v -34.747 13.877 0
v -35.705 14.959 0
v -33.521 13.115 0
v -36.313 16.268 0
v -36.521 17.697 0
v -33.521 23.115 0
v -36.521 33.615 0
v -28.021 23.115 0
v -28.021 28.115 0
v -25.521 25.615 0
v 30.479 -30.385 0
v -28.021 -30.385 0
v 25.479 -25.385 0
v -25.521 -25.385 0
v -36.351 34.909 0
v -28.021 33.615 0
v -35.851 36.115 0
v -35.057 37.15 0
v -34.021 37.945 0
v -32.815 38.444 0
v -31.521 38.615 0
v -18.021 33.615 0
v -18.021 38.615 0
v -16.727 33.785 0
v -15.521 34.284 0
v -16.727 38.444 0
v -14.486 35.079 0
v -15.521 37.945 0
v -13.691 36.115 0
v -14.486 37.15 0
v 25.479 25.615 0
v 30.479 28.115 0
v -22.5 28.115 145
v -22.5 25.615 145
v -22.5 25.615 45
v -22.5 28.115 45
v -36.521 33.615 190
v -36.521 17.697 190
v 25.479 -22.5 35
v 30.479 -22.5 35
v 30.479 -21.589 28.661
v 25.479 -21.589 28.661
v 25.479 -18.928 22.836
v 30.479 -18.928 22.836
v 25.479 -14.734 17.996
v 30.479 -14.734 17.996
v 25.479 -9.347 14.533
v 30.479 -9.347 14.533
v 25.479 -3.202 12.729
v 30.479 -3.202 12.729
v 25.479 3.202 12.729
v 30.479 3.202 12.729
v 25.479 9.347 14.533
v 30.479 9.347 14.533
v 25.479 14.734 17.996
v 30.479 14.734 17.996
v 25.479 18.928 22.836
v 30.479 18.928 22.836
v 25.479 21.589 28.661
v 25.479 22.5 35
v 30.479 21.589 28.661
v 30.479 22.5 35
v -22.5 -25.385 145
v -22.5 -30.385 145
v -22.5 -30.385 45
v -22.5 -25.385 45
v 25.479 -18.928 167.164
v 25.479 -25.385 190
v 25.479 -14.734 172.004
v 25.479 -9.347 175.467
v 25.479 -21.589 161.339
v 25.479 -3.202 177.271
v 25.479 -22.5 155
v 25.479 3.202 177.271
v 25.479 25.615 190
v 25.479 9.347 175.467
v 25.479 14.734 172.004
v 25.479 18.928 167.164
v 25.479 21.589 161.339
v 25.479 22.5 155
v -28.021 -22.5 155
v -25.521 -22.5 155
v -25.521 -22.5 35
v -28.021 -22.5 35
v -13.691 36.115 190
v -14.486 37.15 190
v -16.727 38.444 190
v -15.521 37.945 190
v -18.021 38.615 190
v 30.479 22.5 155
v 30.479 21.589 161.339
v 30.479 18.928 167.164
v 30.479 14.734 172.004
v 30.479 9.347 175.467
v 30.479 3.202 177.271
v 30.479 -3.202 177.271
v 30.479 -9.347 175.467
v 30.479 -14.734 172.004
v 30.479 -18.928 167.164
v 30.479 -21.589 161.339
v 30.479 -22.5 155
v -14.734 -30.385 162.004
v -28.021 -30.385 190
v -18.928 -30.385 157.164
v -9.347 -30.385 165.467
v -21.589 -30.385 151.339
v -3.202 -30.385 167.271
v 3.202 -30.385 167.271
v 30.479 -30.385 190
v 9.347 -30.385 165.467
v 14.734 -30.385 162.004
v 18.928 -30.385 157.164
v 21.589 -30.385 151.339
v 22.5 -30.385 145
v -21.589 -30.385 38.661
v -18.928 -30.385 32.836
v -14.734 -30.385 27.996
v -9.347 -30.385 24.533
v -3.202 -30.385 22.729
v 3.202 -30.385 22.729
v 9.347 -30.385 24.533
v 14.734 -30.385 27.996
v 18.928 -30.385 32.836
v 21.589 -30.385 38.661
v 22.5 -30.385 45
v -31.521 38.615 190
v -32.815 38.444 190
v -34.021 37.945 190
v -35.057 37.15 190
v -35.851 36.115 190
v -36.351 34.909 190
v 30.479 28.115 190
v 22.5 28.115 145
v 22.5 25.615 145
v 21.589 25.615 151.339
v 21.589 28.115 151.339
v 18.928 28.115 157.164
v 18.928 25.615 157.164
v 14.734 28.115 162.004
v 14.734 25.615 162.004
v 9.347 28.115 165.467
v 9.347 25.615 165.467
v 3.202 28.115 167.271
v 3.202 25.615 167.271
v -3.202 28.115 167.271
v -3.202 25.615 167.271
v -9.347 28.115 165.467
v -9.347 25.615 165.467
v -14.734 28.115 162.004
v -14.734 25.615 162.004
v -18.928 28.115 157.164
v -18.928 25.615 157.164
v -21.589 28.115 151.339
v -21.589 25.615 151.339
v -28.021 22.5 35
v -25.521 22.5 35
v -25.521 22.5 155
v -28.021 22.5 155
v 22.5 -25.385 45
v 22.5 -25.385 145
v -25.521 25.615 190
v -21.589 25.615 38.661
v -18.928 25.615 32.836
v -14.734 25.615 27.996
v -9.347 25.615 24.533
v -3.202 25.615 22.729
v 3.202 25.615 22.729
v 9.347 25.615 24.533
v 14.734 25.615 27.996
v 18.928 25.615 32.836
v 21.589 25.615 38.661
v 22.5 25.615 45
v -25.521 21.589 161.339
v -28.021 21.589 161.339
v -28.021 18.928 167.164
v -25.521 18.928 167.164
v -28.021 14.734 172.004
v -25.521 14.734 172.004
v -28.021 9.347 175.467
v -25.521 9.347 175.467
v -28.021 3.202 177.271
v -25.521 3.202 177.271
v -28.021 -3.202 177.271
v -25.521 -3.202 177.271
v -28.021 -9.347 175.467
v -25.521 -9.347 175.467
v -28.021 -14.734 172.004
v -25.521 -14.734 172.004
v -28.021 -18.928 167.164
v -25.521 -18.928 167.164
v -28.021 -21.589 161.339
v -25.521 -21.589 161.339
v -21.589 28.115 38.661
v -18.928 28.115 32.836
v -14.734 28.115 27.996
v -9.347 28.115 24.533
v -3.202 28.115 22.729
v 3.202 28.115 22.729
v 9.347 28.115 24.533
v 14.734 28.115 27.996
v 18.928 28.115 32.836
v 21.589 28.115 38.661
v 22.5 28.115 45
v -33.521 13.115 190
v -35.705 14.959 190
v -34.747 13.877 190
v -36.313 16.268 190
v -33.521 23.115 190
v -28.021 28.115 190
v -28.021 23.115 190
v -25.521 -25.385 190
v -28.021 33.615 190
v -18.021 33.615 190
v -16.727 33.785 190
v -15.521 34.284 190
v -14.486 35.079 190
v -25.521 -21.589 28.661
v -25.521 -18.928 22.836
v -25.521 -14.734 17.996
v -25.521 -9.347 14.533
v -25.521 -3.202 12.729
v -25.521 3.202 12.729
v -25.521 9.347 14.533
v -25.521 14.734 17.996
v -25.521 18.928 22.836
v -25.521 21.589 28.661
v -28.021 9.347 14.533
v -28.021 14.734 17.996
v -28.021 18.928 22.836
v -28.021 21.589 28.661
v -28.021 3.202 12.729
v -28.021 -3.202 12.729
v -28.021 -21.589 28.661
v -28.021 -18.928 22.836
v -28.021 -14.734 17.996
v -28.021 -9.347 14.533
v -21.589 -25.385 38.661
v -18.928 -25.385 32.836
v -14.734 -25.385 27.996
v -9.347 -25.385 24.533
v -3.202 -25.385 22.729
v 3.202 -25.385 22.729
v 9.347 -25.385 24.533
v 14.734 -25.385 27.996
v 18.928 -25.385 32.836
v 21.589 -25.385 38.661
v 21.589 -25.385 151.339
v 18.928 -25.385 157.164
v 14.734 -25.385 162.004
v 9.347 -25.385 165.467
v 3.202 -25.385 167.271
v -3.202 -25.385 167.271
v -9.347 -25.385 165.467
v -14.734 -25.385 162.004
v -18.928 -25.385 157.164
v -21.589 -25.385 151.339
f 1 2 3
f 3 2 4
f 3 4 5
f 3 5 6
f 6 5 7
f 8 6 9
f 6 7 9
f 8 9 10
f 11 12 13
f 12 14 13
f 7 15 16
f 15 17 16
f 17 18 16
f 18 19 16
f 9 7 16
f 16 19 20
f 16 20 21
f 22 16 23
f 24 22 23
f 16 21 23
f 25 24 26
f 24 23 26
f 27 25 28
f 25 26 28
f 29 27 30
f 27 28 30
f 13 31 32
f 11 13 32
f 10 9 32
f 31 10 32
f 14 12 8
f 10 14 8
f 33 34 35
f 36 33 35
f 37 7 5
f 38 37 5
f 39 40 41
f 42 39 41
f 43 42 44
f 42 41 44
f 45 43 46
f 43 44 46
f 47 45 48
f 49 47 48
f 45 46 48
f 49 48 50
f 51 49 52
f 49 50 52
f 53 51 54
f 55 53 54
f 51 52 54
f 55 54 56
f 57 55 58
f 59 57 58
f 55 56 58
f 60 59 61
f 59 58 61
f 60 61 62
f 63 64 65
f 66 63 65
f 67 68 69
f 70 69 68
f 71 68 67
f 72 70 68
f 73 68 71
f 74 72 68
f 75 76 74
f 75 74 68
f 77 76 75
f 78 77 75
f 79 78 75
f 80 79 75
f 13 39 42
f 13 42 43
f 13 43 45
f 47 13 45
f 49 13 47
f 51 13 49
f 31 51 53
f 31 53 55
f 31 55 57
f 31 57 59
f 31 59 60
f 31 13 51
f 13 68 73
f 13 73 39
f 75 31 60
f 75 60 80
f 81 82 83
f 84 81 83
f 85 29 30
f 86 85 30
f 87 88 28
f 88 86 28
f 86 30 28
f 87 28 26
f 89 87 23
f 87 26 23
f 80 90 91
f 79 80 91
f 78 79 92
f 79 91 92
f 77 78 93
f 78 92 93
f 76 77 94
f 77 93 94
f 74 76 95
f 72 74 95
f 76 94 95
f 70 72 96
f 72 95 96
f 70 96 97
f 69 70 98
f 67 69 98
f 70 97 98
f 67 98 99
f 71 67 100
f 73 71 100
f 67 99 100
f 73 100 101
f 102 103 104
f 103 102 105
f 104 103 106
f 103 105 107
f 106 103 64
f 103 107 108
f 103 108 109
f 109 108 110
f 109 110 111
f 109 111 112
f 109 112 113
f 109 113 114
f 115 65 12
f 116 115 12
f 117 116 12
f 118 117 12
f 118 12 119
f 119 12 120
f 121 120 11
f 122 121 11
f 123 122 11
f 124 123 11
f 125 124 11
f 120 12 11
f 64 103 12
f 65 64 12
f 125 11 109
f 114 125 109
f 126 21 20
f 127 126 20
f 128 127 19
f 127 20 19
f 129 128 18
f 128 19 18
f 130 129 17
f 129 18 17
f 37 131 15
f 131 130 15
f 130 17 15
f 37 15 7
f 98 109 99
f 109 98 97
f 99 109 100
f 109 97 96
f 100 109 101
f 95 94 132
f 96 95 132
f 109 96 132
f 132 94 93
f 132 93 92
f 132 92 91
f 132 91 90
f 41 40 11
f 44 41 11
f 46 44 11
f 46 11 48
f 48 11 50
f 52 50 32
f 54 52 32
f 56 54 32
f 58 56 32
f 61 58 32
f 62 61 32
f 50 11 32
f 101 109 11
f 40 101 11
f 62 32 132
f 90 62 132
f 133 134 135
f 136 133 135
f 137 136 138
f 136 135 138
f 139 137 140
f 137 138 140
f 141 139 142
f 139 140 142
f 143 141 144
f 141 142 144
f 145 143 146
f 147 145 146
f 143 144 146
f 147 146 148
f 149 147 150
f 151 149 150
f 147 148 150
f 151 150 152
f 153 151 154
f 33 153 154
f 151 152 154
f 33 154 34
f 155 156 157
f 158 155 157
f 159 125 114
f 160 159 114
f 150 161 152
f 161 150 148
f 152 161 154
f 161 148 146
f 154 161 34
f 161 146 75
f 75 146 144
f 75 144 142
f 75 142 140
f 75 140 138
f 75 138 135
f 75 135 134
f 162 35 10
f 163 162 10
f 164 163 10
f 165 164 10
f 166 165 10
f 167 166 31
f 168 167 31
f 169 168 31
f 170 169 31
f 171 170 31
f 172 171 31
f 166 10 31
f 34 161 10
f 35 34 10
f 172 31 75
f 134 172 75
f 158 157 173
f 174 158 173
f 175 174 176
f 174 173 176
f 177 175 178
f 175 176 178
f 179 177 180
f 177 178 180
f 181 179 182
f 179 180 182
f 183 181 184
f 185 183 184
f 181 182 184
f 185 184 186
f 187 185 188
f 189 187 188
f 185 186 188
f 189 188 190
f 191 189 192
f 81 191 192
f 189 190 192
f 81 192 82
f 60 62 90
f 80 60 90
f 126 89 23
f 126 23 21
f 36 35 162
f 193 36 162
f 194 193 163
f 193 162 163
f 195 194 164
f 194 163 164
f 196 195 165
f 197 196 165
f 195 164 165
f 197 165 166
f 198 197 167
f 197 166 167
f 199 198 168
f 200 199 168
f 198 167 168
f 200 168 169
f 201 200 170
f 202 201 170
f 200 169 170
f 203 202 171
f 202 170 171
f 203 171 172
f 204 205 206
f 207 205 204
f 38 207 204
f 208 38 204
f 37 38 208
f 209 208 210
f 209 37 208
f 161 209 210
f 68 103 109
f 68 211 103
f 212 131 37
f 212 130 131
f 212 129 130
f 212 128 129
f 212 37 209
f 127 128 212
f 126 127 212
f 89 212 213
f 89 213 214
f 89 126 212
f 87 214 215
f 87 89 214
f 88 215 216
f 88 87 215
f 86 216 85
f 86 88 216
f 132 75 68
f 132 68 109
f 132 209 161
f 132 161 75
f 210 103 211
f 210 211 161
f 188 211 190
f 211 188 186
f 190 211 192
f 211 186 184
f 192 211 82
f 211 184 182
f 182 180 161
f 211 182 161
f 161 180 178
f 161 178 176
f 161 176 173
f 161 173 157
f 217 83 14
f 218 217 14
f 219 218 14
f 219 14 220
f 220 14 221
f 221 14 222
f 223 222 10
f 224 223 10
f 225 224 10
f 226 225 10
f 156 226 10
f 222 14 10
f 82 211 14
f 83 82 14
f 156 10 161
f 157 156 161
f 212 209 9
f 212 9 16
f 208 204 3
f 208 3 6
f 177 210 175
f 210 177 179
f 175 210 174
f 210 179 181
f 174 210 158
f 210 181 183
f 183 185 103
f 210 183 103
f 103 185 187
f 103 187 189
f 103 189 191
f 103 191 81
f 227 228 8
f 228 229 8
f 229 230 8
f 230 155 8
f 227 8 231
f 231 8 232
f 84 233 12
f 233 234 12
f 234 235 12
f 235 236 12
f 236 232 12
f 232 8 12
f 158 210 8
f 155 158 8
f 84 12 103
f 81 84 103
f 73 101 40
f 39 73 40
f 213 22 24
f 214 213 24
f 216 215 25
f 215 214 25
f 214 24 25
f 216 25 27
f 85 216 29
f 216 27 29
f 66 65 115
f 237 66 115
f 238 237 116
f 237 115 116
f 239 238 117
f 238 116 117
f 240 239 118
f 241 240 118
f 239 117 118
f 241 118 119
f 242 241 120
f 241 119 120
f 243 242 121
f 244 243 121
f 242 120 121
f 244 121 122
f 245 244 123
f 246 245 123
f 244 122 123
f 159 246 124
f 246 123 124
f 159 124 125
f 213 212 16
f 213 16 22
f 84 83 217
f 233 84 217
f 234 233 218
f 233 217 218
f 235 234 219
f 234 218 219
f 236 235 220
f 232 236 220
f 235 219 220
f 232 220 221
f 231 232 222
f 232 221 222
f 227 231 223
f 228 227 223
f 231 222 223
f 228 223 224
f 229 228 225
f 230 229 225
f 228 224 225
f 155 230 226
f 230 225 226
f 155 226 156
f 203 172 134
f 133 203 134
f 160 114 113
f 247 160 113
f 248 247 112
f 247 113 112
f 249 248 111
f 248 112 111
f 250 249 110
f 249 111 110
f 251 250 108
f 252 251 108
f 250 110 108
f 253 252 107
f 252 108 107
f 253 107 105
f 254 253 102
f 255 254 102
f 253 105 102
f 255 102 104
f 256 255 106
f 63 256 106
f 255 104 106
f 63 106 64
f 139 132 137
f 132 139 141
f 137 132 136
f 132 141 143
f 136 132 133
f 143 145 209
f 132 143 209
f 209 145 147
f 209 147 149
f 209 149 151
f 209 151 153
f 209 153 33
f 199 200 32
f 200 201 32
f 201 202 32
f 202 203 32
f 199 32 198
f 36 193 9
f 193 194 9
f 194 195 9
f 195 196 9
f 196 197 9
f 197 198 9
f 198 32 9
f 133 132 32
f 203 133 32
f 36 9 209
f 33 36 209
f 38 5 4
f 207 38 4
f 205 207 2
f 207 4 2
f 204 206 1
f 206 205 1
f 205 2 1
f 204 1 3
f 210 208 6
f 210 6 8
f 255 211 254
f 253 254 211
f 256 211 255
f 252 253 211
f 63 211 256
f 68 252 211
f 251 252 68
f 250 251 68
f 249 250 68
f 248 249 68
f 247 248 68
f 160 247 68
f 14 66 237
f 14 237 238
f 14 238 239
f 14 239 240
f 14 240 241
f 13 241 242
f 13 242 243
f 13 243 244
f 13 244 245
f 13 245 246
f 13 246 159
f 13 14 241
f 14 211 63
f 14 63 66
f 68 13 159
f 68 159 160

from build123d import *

# Parameters (mm, degrees)
F0_W        = 5.5
F0_H        = 5
F0_W_2      = 51
F0_H_2      = 51
F1_DEPTH    = 190
F2_T1_DEPTH = 215
F2_T3_DEPTH = 212.9128784748
F4_DEPTH    = 60
F6_DEPTH    = 60


# Not quite as in the source:
# - a fillet or chamfer that OpenCascade refuses, or shapes differently, is made with other operations: its cross-section is extruded or revolved along the edge and cut away or added


with BuildPart() as f1:
    # F0 (on Top) → F1 (new body)
    with BuildSketch(Plane.XY):
        Polygon((-33.5212003861, 28.1146157656), (-28.0212003861, 28.1146157656), (-28.0212003861, 33.6146157656), (-28.0212003861, 38.6146157656), (-36.5212003861, 38.6146157656), (-36.5212003861, 28.1146157656), align=None)
        Polygon((-28.0212003861, 38.6146157656), (-28.0212003861, 33.6146157656), (-23.0212003861, 33.6146157656), (-13.0212003861, 33.6146157656), (-13.0212003861, 38.6146157656), align=None)
        with Locations((-30.7712003861, 25.6146157656)):
            Rectangle(F0_W, F0_H)
        Polygon((-33.5212003861, 23.1146157656), (-33.5212003861, 28.1146157656), (-36.5212003861, 28.1146157656), (-36.5212003861, 13.1146157656), (-33.5212003861, 13.1146157656), align=None)
        Polygon((-23.0212003861, 28.1146157656), (-28.0212003861, 28.1146157656), (-28.0212003861, 23.1146157656), (-28.0212003861, -30.3853842344), (30.4787996139, -30.3853842344), (30.4787996139, 28.1146157656), align=None)
        with Locations((-0.0212003861, 0.1146157656)):
            Rectangle(F0_W_2, F0_H_2, mode=Mode.SUBTRACT)
    extrude(amount=F1_DEPTH)

    # F2: fillet of radius 5 on 4 edges, made by hand

    # F2_s2 → F2_t1 (cut)
    with BuildSketch(Plane.XY.offset(-12.5)):
        with BuildLine():
            ThreePointArc((-31.5212003861, 38.6146157656), (-35.056734292, 37.1501496716), (-36.5212003861, 33.6146157656))
            Line((-36.5212003861, 33.6146157656), (-36.5212003861, 38.6146157656))
            Line((-36.5212003861, 38.6146157656), (-31.5212003861, 38.6146157656))
        make_face()
        with BuildLine():
            ThreePointArc((-13.0212003861, 33.6146157656), (-14.4856664802, 37.1501496716), (-18.0212003861, 38.6146157656))
            Line((-18.0212003861, 38.6146157656), (-13.0212003861, 38.6146157656))
            Line((-13.0212003861, 38.6146157656), (-13.0212003861, 33.6146157656))
        make_face()
        with BuildLine():
            ThreePointArc((-18.0212003861, 33.6146157656), (-14.4856664802, 35.0790818597), (-13.0212003861, 38.6146157656))
            Line((-13.0212003861, 38.6146157656), (-13.0212003861, 33.6146157656))
            Line((-13.0212003861, 33.6146157656), (-18.0212003861, 33.6146157656))
        make_face()
    extrude(amount=F2_T1_DEPTH, mode=Mode.SUBTRACT)

    # F2_s4 → F2_t3 (cut)
    with BuildSketch(Plane.XY.offset(-11.4564392374)):
        with BuildLine():
            ThreePointArc((-36.5212003861, 17.6971914606), (-35.7045005188, 14.9585786731), (-33.5212003861, 13.1146157656))
            Line((-33.5212003861, 13.1146157656), (-36.5212003861, 13.1146157656))
            Line((-36.5212003861, 13.1146157656), (-36.5212003861, 17.6971914606))
        make_face()
    extrude(amount=F2_T3_DEPTH, mode=Mode.SUBTRACT)

    # F3 (on face) → F4 (cut)
    with BuildSketch(Plane.YZ.offset(30.4787996139)):
        with BuildLine():
            Line((-22.5, 155), (22.5, 155))
            ThreePointArc((22.5, 155), (0, 177.5), (-22.5, 155))
        make_face()
        with BuildLine():
            ThreePointArc((-22.5, 155), (0, 132.5), (22.5, 155))
            Line((22.5, 155), (-22.5, 155))
        make_face()
        with BuildLine():
            ThreePointArc((-22.5, 35), (0, 57.5), (22.5, 35))
            Line((22.5, 35), (22.5, 155))
            ThreePointArc((22.5, 155), (0, 132.5), (-22.5, 155))
            Line((-22.5, 155), (-22.5, 35))
        make_face()
        with BuildLine():
            Line((-22.5, 35), (22.5, 35))
            ThreePointArc((22.5, 35), (0, 57.5), (-22.5, 35))
        make_face()
        with BuildLine():
            ThreePointArc((-22.5, 35), (0, 12.5), (22.5, 35))
            Line((22.5, 35), (-22.5, 35))
        make_face()
    extrude(amount=-F4_DEPTH, mode=Mode.SUBTRACT)

    # F5 (on face) → F6 (cut)
    with BuildSketch(Plane.XZ.offset(30.3853842344)):
        with BuildLine():
            Line((-22.5, 145), (22.5, 145))
            ThreePointArc((22.5, 145), (0, 167.5), (-22.5, 145))
        make_face()
        with BuildLine():
            ThreePointArc((-22.5, 145), (0, 122.5), (22.5, 145))
            Line((22.5, 145), (-22.5, 145))
        make_face()
        with BuildLine():
            Line((22.5, 45), (22.5, 145))
            ThreePointArc((22.5, 145), (0, 122.5), (-22.5, 145))
            Line((-22.5, 145), (-22.5, 45))
            ThreePointArc((-22.5, 45), (0, 67.5), (22.5, 45))
        make_face()
        with BuildLine():
            Line((-22.5, 45), (22.5, 45))
            ThreePointArc((22.5, 45), (0, 67.5), (-22.5, 45))
        make_face()
        with BuildLine():
            ThreePointArc((-22.5, 45), (0, 22.5), (22.5, 45))
            Line((22.5, 45), (-22.5, 45))
        make_face()
    extrude(amount=-F6_DEPTH, mode=Mode.SUBTRACT)


solid = f1.part
